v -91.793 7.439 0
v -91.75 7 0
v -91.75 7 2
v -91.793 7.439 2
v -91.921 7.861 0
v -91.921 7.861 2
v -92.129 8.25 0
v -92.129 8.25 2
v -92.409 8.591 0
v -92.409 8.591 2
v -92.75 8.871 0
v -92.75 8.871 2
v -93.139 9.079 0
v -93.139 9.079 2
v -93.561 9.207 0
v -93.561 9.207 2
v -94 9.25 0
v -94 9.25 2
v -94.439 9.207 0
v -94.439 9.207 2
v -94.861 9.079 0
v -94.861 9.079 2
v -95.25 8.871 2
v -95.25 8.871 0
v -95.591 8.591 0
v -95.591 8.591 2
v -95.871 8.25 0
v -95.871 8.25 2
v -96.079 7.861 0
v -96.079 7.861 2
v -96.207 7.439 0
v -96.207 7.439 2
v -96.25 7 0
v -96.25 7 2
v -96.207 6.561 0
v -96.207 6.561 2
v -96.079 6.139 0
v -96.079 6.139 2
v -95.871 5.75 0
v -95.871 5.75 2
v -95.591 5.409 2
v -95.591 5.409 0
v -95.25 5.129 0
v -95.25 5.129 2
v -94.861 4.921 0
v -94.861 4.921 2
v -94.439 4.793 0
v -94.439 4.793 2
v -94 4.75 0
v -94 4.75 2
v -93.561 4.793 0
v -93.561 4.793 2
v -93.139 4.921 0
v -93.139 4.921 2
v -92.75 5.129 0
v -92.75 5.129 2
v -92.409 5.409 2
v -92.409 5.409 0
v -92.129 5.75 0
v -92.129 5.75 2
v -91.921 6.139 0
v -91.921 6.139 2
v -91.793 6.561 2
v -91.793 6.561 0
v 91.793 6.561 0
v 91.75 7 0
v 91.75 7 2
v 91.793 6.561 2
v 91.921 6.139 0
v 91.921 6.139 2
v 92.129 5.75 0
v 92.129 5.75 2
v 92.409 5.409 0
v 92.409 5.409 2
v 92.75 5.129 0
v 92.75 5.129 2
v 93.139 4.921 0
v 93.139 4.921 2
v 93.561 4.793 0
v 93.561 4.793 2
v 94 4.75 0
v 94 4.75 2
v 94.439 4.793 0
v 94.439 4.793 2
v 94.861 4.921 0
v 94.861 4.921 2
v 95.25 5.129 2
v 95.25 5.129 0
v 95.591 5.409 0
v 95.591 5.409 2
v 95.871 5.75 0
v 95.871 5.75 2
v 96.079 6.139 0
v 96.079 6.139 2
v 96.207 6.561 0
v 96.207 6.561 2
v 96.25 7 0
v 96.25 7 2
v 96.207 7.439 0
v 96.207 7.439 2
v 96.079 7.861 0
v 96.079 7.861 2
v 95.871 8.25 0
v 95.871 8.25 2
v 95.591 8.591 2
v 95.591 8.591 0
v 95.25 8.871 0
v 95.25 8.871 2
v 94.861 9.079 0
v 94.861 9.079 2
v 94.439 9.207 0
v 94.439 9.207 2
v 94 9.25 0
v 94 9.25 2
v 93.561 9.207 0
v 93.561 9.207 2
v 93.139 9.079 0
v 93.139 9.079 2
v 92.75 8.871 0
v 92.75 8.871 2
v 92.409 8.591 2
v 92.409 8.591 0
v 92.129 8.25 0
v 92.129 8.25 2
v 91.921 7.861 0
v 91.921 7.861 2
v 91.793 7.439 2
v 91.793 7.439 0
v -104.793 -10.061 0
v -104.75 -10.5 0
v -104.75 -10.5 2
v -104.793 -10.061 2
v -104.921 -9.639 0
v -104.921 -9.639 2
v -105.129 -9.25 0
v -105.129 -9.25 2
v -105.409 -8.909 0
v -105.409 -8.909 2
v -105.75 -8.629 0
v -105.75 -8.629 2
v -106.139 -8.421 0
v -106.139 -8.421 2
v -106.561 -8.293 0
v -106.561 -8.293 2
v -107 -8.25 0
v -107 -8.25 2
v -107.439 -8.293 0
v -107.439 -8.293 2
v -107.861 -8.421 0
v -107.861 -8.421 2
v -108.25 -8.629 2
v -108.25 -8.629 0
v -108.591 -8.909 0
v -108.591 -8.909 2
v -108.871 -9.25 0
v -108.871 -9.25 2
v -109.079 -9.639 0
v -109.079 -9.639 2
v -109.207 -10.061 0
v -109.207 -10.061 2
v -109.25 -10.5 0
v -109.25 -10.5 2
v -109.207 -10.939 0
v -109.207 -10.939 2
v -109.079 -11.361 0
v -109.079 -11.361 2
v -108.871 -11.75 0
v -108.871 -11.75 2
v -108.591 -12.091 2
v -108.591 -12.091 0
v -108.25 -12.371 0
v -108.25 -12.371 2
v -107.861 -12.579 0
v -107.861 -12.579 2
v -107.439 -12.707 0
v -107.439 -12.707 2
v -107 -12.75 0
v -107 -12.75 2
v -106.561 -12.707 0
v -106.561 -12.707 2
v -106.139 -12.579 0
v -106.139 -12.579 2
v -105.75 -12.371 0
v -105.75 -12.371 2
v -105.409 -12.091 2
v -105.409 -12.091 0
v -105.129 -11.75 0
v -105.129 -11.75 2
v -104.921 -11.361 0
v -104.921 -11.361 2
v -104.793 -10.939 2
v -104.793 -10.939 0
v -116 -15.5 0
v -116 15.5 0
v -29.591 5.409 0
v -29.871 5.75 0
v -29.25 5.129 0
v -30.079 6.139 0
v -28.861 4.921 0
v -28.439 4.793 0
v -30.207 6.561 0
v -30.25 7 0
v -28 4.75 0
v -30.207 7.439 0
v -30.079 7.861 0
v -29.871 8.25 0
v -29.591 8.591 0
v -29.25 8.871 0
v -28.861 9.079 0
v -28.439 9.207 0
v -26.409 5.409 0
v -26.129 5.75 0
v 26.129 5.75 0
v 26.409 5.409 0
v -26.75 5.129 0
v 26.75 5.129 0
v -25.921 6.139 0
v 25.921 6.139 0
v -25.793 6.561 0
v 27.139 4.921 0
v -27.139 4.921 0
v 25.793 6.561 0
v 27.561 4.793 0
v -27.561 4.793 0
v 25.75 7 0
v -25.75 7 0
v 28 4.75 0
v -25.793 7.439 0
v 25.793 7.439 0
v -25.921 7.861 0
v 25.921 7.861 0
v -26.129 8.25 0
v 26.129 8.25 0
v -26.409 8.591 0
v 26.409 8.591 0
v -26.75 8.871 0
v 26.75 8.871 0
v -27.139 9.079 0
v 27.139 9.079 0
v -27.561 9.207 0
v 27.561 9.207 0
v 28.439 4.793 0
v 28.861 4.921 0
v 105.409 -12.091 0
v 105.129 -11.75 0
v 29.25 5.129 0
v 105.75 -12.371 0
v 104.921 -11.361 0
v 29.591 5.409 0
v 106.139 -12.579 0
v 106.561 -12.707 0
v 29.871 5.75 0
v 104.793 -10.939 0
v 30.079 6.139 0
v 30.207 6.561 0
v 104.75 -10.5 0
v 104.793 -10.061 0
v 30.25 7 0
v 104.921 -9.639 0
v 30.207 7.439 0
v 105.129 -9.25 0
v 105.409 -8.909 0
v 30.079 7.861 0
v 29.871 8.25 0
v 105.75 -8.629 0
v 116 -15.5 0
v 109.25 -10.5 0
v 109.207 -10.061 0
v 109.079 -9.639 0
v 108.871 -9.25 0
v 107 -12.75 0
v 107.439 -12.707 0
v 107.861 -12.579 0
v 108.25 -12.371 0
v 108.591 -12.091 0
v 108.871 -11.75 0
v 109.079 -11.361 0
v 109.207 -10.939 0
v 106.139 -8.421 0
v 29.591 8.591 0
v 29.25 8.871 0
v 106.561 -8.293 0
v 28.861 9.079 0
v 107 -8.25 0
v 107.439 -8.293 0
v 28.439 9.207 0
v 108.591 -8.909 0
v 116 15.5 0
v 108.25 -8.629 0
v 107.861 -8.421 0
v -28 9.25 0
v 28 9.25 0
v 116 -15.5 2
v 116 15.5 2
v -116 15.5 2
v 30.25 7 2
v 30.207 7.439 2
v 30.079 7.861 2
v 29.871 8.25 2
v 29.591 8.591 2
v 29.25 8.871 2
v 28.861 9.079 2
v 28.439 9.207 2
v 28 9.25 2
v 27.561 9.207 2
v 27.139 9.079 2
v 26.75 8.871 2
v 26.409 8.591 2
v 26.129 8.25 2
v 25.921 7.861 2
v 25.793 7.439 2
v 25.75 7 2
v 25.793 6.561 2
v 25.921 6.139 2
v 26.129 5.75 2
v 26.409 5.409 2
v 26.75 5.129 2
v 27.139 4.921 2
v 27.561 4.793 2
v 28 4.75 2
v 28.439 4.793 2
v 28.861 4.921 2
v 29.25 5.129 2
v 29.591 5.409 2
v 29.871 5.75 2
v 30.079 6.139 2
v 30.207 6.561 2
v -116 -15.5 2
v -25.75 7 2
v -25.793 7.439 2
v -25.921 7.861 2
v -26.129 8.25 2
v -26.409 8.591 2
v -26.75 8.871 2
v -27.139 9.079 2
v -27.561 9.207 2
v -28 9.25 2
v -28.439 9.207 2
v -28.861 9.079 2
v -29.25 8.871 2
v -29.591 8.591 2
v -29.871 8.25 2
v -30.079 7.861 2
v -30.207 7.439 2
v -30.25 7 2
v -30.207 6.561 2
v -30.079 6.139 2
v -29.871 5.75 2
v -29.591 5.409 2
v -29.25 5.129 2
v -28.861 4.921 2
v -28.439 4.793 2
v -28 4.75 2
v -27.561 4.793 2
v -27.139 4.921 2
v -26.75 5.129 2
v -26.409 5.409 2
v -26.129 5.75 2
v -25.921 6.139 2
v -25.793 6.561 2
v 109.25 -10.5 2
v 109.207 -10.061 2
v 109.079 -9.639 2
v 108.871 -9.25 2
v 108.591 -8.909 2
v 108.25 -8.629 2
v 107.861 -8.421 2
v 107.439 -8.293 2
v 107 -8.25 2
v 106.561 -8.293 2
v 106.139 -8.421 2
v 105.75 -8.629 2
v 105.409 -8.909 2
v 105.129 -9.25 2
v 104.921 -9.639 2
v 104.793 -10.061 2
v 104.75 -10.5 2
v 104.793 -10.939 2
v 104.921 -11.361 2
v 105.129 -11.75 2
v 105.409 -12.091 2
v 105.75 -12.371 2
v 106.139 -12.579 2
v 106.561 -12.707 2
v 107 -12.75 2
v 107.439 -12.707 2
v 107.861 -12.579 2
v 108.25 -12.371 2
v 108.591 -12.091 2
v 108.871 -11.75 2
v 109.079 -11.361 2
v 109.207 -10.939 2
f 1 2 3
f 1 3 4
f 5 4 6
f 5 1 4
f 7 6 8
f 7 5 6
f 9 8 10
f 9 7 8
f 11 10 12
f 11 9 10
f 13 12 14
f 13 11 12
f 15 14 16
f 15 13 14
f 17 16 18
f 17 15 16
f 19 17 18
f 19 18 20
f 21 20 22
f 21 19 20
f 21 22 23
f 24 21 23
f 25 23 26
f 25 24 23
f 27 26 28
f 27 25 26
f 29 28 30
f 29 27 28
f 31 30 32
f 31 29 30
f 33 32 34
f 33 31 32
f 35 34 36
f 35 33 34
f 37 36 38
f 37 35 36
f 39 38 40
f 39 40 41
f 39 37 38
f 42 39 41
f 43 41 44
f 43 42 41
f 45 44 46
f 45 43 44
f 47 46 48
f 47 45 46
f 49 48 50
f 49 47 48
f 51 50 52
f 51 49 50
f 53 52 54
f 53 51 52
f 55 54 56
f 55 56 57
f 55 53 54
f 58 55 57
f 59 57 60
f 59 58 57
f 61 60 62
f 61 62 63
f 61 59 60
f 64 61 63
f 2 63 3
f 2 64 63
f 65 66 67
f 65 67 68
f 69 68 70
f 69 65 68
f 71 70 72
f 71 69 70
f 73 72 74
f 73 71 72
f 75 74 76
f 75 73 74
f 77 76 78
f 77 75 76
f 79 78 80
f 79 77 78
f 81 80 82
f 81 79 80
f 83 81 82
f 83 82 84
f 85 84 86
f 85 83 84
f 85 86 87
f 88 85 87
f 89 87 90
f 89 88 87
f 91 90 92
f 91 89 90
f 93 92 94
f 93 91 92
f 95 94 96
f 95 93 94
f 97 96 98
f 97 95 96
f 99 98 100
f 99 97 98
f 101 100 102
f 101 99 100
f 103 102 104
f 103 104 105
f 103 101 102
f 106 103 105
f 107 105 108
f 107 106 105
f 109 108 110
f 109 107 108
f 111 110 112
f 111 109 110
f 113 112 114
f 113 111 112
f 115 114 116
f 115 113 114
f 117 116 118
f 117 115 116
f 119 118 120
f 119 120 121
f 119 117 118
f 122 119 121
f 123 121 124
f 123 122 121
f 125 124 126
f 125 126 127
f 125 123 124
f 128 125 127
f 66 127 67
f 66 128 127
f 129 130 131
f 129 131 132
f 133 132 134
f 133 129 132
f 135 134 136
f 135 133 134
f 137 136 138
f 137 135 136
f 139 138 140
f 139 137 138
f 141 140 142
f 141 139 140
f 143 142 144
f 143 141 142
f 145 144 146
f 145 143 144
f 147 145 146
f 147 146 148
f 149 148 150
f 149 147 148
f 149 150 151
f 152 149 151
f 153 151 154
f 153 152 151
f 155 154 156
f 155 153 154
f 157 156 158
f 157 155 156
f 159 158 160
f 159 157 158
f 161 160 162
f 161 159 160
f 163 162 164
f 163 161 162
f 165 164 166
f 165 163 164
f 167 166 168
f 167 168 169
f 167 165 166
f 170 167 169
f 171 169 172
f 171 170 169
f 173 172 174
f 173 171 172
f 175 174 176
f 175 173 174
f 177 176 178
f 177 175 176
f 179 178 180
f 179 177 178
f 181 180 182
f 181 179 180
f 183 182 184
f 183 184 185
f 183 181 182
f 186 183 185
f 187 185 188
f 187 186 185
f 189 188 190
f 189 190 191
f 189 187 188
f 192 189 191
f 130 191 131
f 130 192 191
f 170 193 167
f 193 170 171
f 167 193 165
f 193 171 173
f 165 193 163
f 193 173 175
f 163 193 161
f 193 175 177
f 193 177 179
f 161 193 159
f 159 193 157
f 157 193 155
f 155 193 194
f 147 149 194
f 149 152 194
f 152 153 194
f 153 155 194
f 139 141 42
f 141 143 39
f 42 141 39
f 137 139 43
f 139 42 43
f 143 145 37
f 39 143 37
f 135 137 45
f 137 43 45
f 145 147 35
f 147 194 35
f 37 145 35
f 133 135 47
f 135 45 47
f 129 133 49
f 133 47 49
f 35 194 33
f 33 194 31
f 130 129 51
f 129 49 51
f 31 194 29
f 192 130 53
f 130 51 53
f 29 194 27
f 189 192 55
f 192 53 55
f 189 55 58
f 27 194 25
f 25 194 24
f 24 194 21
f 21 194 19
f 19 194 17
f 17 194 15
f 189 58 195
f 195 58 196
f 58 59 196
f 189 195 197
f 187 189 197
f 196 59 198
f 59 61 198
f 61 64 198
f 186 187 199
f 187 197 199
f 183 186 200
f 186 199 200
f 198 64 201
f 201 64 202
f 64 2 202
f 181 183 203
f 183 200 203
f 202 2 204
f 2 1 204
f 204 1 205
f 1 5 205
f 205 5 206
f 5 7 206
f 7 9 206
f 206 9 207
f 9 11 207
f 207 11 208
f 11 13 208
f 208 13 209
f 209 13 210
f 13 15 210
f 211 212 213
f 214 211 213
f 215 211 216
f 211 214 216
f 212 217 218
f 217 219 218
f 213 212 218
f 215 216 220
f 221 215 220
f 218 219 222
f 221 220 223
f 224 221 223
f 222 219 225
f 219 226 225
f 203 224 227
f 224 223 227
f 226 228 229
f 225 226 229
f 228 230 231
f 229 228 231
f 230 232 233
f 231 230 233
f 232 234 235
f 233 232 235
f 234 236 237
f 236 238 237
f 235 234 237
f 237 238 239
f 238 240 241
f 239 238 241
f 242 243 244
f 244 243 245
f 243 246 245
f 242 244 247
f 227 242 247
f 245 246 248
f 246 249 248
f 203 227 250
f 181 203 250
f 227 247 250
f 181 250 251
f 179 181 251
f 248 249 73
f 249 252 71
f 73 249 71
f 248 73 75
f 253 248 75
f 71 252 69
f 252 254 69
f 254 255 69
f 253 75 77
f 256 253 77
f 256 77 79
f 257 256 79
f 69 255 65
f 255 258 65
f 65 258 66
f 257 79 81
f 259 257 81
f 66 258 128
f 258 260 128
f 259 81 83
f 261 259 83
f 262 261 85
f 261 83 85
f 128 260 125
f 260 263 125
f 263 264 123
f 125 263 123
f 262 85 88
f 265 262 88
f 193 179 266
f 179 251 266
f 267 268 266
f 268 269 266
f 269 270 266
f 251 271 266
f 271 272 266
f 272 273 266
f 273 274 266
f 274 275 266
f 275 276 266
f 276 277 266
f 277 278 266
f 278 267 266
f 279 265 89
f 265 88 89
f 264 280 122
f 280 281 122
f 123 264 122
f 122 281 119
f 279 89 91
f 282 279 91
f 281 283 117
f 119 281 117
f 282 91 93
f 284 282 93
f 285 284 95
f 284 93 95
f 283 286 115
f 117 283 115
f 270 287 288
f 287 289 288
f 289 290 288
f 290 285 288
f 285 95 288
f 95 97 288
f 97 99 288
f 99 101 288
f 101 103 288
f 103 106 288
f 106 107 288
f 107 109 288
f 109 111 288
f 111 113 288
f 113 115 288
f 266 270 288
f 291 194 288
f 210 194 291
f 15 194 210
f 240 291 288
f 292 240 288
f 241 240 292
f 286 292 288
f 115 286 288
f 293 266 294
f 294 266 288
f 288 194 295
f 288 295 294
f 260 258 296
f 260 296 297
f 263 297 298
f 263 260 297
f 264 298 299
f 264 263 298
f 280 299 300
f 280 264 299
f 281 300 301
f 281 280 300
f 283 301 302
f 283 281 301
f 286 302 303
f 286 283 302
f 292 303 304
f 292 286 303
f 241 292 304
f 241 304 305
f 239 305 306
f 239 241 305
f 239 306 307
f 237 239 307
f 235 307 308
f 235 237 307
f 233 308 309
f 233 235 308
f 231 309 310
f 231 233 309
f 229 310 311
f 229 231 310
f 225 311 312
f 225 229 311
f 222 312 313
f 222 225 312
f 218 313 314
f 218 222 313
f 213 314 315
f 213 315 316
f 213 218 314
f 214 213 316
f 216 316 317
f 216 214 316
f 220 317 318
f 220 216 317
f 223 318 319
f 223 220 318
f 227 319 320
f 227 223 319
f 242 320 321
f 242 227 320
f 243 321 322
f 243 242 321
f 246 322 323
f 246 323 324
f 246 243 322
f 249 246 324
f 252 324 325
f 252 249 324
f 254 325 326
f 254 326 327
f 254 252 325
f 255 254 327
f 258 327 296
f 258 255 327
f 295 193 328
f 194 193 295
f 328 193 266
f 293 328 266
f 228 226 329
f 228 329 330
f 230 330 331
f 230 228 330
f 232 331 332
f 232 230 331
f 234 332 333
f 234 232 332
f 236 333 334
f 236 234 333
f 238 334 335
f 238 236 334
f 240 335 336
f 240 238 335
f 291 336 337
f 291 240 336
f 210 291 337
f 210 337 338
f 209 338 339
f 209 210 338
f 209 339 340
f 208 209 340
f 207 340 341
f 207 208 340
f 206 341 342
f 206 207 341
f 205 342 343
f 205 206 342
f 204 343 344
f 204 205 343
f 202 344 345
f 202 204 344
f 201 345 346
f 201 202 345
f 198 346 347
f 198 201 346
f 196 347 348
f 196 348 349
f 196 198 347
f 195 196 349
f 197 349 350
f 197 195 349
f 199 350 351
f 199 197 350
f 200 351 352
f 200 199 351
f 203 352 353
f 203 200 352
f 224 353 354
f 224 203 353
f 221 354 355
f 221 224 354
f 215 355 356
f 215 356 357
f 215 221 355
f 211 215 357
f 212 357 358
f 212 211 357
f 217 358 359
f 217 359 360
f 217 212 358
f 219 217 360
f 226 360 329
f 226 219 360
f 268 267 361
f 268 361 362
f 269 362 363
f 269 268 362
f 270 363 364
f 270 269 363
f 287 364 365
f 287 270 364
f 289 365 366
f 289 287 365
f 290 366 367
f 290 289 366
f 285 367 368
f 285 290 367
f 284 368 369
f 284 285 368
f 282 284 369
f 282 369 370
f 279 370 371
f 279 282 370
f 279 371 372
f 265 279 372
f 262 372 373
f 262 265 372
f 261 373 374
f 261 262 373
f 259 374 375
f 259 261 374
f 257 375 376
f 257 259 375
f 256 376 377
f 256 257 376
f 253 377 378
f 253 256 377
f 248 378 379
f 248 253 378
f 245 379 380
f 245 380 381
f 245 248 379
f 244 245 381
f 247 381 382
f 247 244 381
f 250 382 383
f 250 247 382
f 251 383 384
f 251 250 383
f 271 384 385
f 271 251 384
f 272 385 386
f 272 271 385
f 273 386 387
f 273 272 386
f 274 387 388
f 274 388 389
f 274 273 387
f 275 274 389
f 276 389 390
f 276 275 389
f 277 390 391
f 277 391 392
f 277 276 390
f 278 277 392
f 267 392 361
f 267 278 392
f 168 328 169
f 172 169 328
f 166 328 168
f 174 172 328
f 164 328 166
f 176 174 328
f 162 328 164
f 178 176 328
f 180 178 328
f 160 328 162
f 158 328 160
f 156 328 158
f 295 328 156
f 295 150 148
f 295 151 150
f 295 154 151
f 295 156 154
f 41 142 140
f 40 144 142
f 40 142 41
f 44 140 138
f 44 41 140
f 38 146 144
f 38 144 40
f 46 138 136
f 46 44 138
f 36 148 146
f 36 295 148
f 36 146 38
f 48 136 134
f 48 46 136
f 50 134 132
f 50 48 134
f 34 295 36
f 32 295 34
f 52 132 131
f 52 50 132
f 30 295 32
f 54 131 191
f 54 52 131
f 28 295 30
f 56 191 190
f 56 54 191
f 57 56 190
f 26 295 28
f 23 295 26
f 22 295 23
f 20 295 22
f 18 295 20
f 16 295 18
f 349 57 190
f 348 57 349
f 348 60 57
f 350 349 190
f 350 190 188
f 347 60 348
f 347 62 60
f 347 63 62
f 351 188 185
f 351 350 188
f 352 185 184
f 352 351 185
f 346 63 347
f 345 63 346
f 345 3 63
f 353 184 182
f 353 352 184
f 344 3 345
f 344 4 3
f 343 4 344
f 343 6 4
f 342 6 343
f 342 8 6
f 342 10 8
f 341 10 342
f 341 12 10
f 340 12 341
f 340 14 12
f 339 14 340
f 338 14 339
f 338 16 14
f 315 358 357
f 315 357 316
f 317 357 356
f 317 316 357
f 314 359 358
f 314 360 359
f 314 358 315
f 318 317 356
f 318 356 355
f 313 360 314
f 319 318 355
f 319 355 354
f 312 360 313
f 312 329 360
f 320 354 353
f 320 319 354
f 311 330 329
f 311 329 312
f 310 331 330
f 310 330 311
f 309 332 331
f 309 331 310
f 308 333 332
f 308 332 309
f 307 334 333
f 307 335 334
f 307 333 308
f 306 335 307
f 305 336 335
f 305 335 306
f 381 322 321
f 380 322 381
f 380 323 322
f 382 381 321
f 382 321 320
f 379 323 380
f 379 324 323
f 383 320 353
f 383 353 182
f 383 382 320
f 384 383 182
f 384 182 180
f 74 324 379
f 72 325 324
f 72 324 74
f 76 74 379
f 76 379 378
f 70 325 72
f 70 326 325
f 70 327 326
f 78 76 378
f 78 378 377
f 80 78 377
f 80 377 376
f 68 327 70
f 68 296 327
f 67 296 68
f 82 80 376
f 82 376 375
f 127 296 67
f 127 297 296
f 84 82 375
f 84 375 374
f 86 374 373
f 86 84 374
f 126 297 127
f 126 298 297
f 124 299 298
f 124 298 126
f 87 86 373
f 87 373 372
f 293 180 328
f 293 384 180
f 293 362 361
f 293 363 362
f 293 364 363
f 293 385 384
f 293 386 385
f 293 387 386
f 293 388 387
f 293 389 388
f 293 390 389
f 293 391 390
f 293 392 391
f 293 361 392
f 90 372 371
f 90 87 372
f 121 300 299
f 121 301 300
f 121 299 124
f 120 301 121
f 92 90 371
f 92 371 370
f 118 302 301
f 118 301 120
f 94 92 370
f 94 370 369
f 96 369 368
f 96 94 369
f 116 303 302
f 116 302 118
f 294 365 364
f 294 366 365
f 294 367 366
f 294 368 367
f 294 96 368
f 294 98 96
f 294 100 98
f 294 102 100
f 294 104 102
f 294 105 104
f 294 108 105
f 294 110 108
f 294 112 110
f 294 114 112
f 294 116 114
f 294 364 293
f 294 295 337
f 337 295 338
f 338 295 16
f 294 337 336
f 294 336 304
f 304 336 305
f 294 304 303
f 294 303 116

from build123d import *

# Parameters (mm, degrees)
SKETCH_1_W      = 232
SKETCH_1_H      = 31
SKETCH_1_R      = 2.25
EXTRUDE_1_DEPTH = 2


with BuildPart() as part:
    # Эскиз1 → Вытянуть1 (new body)
    with BuildSketch(Plane.XY):
        Rectangle(SKETCH_1_W, SKETCH_1_H)
        with Locations((-28, 7)):
            Circle(SKETCH_1_R, mode=Mode.SUBTRACT)
        with Locations((28, 7)):
            Circle(SKETCH_1_R, mode=Mode.SUBTRACT)
        with Locations((-94, 7)):
            Circle(SKETCH_1_R, mode=Mode.SUBTRACT)
        with Locations(Location((94, 7, 0), (0, 0, 180))):
            Circle(SKETCH_1_R, mode=Mode.SUBTRACT)
        with Locations((-107, -10.5)):
            Circle(SKETCH_1_R, mode=Mode.SUBTRACT)
        with Locations((107, -10.5)):
            Circle(SKETCH_1_R, mode=Mode.SUBTRACT)
    extrude(amount=EXTRUDE_1_DEPTH)


solid = part.part
